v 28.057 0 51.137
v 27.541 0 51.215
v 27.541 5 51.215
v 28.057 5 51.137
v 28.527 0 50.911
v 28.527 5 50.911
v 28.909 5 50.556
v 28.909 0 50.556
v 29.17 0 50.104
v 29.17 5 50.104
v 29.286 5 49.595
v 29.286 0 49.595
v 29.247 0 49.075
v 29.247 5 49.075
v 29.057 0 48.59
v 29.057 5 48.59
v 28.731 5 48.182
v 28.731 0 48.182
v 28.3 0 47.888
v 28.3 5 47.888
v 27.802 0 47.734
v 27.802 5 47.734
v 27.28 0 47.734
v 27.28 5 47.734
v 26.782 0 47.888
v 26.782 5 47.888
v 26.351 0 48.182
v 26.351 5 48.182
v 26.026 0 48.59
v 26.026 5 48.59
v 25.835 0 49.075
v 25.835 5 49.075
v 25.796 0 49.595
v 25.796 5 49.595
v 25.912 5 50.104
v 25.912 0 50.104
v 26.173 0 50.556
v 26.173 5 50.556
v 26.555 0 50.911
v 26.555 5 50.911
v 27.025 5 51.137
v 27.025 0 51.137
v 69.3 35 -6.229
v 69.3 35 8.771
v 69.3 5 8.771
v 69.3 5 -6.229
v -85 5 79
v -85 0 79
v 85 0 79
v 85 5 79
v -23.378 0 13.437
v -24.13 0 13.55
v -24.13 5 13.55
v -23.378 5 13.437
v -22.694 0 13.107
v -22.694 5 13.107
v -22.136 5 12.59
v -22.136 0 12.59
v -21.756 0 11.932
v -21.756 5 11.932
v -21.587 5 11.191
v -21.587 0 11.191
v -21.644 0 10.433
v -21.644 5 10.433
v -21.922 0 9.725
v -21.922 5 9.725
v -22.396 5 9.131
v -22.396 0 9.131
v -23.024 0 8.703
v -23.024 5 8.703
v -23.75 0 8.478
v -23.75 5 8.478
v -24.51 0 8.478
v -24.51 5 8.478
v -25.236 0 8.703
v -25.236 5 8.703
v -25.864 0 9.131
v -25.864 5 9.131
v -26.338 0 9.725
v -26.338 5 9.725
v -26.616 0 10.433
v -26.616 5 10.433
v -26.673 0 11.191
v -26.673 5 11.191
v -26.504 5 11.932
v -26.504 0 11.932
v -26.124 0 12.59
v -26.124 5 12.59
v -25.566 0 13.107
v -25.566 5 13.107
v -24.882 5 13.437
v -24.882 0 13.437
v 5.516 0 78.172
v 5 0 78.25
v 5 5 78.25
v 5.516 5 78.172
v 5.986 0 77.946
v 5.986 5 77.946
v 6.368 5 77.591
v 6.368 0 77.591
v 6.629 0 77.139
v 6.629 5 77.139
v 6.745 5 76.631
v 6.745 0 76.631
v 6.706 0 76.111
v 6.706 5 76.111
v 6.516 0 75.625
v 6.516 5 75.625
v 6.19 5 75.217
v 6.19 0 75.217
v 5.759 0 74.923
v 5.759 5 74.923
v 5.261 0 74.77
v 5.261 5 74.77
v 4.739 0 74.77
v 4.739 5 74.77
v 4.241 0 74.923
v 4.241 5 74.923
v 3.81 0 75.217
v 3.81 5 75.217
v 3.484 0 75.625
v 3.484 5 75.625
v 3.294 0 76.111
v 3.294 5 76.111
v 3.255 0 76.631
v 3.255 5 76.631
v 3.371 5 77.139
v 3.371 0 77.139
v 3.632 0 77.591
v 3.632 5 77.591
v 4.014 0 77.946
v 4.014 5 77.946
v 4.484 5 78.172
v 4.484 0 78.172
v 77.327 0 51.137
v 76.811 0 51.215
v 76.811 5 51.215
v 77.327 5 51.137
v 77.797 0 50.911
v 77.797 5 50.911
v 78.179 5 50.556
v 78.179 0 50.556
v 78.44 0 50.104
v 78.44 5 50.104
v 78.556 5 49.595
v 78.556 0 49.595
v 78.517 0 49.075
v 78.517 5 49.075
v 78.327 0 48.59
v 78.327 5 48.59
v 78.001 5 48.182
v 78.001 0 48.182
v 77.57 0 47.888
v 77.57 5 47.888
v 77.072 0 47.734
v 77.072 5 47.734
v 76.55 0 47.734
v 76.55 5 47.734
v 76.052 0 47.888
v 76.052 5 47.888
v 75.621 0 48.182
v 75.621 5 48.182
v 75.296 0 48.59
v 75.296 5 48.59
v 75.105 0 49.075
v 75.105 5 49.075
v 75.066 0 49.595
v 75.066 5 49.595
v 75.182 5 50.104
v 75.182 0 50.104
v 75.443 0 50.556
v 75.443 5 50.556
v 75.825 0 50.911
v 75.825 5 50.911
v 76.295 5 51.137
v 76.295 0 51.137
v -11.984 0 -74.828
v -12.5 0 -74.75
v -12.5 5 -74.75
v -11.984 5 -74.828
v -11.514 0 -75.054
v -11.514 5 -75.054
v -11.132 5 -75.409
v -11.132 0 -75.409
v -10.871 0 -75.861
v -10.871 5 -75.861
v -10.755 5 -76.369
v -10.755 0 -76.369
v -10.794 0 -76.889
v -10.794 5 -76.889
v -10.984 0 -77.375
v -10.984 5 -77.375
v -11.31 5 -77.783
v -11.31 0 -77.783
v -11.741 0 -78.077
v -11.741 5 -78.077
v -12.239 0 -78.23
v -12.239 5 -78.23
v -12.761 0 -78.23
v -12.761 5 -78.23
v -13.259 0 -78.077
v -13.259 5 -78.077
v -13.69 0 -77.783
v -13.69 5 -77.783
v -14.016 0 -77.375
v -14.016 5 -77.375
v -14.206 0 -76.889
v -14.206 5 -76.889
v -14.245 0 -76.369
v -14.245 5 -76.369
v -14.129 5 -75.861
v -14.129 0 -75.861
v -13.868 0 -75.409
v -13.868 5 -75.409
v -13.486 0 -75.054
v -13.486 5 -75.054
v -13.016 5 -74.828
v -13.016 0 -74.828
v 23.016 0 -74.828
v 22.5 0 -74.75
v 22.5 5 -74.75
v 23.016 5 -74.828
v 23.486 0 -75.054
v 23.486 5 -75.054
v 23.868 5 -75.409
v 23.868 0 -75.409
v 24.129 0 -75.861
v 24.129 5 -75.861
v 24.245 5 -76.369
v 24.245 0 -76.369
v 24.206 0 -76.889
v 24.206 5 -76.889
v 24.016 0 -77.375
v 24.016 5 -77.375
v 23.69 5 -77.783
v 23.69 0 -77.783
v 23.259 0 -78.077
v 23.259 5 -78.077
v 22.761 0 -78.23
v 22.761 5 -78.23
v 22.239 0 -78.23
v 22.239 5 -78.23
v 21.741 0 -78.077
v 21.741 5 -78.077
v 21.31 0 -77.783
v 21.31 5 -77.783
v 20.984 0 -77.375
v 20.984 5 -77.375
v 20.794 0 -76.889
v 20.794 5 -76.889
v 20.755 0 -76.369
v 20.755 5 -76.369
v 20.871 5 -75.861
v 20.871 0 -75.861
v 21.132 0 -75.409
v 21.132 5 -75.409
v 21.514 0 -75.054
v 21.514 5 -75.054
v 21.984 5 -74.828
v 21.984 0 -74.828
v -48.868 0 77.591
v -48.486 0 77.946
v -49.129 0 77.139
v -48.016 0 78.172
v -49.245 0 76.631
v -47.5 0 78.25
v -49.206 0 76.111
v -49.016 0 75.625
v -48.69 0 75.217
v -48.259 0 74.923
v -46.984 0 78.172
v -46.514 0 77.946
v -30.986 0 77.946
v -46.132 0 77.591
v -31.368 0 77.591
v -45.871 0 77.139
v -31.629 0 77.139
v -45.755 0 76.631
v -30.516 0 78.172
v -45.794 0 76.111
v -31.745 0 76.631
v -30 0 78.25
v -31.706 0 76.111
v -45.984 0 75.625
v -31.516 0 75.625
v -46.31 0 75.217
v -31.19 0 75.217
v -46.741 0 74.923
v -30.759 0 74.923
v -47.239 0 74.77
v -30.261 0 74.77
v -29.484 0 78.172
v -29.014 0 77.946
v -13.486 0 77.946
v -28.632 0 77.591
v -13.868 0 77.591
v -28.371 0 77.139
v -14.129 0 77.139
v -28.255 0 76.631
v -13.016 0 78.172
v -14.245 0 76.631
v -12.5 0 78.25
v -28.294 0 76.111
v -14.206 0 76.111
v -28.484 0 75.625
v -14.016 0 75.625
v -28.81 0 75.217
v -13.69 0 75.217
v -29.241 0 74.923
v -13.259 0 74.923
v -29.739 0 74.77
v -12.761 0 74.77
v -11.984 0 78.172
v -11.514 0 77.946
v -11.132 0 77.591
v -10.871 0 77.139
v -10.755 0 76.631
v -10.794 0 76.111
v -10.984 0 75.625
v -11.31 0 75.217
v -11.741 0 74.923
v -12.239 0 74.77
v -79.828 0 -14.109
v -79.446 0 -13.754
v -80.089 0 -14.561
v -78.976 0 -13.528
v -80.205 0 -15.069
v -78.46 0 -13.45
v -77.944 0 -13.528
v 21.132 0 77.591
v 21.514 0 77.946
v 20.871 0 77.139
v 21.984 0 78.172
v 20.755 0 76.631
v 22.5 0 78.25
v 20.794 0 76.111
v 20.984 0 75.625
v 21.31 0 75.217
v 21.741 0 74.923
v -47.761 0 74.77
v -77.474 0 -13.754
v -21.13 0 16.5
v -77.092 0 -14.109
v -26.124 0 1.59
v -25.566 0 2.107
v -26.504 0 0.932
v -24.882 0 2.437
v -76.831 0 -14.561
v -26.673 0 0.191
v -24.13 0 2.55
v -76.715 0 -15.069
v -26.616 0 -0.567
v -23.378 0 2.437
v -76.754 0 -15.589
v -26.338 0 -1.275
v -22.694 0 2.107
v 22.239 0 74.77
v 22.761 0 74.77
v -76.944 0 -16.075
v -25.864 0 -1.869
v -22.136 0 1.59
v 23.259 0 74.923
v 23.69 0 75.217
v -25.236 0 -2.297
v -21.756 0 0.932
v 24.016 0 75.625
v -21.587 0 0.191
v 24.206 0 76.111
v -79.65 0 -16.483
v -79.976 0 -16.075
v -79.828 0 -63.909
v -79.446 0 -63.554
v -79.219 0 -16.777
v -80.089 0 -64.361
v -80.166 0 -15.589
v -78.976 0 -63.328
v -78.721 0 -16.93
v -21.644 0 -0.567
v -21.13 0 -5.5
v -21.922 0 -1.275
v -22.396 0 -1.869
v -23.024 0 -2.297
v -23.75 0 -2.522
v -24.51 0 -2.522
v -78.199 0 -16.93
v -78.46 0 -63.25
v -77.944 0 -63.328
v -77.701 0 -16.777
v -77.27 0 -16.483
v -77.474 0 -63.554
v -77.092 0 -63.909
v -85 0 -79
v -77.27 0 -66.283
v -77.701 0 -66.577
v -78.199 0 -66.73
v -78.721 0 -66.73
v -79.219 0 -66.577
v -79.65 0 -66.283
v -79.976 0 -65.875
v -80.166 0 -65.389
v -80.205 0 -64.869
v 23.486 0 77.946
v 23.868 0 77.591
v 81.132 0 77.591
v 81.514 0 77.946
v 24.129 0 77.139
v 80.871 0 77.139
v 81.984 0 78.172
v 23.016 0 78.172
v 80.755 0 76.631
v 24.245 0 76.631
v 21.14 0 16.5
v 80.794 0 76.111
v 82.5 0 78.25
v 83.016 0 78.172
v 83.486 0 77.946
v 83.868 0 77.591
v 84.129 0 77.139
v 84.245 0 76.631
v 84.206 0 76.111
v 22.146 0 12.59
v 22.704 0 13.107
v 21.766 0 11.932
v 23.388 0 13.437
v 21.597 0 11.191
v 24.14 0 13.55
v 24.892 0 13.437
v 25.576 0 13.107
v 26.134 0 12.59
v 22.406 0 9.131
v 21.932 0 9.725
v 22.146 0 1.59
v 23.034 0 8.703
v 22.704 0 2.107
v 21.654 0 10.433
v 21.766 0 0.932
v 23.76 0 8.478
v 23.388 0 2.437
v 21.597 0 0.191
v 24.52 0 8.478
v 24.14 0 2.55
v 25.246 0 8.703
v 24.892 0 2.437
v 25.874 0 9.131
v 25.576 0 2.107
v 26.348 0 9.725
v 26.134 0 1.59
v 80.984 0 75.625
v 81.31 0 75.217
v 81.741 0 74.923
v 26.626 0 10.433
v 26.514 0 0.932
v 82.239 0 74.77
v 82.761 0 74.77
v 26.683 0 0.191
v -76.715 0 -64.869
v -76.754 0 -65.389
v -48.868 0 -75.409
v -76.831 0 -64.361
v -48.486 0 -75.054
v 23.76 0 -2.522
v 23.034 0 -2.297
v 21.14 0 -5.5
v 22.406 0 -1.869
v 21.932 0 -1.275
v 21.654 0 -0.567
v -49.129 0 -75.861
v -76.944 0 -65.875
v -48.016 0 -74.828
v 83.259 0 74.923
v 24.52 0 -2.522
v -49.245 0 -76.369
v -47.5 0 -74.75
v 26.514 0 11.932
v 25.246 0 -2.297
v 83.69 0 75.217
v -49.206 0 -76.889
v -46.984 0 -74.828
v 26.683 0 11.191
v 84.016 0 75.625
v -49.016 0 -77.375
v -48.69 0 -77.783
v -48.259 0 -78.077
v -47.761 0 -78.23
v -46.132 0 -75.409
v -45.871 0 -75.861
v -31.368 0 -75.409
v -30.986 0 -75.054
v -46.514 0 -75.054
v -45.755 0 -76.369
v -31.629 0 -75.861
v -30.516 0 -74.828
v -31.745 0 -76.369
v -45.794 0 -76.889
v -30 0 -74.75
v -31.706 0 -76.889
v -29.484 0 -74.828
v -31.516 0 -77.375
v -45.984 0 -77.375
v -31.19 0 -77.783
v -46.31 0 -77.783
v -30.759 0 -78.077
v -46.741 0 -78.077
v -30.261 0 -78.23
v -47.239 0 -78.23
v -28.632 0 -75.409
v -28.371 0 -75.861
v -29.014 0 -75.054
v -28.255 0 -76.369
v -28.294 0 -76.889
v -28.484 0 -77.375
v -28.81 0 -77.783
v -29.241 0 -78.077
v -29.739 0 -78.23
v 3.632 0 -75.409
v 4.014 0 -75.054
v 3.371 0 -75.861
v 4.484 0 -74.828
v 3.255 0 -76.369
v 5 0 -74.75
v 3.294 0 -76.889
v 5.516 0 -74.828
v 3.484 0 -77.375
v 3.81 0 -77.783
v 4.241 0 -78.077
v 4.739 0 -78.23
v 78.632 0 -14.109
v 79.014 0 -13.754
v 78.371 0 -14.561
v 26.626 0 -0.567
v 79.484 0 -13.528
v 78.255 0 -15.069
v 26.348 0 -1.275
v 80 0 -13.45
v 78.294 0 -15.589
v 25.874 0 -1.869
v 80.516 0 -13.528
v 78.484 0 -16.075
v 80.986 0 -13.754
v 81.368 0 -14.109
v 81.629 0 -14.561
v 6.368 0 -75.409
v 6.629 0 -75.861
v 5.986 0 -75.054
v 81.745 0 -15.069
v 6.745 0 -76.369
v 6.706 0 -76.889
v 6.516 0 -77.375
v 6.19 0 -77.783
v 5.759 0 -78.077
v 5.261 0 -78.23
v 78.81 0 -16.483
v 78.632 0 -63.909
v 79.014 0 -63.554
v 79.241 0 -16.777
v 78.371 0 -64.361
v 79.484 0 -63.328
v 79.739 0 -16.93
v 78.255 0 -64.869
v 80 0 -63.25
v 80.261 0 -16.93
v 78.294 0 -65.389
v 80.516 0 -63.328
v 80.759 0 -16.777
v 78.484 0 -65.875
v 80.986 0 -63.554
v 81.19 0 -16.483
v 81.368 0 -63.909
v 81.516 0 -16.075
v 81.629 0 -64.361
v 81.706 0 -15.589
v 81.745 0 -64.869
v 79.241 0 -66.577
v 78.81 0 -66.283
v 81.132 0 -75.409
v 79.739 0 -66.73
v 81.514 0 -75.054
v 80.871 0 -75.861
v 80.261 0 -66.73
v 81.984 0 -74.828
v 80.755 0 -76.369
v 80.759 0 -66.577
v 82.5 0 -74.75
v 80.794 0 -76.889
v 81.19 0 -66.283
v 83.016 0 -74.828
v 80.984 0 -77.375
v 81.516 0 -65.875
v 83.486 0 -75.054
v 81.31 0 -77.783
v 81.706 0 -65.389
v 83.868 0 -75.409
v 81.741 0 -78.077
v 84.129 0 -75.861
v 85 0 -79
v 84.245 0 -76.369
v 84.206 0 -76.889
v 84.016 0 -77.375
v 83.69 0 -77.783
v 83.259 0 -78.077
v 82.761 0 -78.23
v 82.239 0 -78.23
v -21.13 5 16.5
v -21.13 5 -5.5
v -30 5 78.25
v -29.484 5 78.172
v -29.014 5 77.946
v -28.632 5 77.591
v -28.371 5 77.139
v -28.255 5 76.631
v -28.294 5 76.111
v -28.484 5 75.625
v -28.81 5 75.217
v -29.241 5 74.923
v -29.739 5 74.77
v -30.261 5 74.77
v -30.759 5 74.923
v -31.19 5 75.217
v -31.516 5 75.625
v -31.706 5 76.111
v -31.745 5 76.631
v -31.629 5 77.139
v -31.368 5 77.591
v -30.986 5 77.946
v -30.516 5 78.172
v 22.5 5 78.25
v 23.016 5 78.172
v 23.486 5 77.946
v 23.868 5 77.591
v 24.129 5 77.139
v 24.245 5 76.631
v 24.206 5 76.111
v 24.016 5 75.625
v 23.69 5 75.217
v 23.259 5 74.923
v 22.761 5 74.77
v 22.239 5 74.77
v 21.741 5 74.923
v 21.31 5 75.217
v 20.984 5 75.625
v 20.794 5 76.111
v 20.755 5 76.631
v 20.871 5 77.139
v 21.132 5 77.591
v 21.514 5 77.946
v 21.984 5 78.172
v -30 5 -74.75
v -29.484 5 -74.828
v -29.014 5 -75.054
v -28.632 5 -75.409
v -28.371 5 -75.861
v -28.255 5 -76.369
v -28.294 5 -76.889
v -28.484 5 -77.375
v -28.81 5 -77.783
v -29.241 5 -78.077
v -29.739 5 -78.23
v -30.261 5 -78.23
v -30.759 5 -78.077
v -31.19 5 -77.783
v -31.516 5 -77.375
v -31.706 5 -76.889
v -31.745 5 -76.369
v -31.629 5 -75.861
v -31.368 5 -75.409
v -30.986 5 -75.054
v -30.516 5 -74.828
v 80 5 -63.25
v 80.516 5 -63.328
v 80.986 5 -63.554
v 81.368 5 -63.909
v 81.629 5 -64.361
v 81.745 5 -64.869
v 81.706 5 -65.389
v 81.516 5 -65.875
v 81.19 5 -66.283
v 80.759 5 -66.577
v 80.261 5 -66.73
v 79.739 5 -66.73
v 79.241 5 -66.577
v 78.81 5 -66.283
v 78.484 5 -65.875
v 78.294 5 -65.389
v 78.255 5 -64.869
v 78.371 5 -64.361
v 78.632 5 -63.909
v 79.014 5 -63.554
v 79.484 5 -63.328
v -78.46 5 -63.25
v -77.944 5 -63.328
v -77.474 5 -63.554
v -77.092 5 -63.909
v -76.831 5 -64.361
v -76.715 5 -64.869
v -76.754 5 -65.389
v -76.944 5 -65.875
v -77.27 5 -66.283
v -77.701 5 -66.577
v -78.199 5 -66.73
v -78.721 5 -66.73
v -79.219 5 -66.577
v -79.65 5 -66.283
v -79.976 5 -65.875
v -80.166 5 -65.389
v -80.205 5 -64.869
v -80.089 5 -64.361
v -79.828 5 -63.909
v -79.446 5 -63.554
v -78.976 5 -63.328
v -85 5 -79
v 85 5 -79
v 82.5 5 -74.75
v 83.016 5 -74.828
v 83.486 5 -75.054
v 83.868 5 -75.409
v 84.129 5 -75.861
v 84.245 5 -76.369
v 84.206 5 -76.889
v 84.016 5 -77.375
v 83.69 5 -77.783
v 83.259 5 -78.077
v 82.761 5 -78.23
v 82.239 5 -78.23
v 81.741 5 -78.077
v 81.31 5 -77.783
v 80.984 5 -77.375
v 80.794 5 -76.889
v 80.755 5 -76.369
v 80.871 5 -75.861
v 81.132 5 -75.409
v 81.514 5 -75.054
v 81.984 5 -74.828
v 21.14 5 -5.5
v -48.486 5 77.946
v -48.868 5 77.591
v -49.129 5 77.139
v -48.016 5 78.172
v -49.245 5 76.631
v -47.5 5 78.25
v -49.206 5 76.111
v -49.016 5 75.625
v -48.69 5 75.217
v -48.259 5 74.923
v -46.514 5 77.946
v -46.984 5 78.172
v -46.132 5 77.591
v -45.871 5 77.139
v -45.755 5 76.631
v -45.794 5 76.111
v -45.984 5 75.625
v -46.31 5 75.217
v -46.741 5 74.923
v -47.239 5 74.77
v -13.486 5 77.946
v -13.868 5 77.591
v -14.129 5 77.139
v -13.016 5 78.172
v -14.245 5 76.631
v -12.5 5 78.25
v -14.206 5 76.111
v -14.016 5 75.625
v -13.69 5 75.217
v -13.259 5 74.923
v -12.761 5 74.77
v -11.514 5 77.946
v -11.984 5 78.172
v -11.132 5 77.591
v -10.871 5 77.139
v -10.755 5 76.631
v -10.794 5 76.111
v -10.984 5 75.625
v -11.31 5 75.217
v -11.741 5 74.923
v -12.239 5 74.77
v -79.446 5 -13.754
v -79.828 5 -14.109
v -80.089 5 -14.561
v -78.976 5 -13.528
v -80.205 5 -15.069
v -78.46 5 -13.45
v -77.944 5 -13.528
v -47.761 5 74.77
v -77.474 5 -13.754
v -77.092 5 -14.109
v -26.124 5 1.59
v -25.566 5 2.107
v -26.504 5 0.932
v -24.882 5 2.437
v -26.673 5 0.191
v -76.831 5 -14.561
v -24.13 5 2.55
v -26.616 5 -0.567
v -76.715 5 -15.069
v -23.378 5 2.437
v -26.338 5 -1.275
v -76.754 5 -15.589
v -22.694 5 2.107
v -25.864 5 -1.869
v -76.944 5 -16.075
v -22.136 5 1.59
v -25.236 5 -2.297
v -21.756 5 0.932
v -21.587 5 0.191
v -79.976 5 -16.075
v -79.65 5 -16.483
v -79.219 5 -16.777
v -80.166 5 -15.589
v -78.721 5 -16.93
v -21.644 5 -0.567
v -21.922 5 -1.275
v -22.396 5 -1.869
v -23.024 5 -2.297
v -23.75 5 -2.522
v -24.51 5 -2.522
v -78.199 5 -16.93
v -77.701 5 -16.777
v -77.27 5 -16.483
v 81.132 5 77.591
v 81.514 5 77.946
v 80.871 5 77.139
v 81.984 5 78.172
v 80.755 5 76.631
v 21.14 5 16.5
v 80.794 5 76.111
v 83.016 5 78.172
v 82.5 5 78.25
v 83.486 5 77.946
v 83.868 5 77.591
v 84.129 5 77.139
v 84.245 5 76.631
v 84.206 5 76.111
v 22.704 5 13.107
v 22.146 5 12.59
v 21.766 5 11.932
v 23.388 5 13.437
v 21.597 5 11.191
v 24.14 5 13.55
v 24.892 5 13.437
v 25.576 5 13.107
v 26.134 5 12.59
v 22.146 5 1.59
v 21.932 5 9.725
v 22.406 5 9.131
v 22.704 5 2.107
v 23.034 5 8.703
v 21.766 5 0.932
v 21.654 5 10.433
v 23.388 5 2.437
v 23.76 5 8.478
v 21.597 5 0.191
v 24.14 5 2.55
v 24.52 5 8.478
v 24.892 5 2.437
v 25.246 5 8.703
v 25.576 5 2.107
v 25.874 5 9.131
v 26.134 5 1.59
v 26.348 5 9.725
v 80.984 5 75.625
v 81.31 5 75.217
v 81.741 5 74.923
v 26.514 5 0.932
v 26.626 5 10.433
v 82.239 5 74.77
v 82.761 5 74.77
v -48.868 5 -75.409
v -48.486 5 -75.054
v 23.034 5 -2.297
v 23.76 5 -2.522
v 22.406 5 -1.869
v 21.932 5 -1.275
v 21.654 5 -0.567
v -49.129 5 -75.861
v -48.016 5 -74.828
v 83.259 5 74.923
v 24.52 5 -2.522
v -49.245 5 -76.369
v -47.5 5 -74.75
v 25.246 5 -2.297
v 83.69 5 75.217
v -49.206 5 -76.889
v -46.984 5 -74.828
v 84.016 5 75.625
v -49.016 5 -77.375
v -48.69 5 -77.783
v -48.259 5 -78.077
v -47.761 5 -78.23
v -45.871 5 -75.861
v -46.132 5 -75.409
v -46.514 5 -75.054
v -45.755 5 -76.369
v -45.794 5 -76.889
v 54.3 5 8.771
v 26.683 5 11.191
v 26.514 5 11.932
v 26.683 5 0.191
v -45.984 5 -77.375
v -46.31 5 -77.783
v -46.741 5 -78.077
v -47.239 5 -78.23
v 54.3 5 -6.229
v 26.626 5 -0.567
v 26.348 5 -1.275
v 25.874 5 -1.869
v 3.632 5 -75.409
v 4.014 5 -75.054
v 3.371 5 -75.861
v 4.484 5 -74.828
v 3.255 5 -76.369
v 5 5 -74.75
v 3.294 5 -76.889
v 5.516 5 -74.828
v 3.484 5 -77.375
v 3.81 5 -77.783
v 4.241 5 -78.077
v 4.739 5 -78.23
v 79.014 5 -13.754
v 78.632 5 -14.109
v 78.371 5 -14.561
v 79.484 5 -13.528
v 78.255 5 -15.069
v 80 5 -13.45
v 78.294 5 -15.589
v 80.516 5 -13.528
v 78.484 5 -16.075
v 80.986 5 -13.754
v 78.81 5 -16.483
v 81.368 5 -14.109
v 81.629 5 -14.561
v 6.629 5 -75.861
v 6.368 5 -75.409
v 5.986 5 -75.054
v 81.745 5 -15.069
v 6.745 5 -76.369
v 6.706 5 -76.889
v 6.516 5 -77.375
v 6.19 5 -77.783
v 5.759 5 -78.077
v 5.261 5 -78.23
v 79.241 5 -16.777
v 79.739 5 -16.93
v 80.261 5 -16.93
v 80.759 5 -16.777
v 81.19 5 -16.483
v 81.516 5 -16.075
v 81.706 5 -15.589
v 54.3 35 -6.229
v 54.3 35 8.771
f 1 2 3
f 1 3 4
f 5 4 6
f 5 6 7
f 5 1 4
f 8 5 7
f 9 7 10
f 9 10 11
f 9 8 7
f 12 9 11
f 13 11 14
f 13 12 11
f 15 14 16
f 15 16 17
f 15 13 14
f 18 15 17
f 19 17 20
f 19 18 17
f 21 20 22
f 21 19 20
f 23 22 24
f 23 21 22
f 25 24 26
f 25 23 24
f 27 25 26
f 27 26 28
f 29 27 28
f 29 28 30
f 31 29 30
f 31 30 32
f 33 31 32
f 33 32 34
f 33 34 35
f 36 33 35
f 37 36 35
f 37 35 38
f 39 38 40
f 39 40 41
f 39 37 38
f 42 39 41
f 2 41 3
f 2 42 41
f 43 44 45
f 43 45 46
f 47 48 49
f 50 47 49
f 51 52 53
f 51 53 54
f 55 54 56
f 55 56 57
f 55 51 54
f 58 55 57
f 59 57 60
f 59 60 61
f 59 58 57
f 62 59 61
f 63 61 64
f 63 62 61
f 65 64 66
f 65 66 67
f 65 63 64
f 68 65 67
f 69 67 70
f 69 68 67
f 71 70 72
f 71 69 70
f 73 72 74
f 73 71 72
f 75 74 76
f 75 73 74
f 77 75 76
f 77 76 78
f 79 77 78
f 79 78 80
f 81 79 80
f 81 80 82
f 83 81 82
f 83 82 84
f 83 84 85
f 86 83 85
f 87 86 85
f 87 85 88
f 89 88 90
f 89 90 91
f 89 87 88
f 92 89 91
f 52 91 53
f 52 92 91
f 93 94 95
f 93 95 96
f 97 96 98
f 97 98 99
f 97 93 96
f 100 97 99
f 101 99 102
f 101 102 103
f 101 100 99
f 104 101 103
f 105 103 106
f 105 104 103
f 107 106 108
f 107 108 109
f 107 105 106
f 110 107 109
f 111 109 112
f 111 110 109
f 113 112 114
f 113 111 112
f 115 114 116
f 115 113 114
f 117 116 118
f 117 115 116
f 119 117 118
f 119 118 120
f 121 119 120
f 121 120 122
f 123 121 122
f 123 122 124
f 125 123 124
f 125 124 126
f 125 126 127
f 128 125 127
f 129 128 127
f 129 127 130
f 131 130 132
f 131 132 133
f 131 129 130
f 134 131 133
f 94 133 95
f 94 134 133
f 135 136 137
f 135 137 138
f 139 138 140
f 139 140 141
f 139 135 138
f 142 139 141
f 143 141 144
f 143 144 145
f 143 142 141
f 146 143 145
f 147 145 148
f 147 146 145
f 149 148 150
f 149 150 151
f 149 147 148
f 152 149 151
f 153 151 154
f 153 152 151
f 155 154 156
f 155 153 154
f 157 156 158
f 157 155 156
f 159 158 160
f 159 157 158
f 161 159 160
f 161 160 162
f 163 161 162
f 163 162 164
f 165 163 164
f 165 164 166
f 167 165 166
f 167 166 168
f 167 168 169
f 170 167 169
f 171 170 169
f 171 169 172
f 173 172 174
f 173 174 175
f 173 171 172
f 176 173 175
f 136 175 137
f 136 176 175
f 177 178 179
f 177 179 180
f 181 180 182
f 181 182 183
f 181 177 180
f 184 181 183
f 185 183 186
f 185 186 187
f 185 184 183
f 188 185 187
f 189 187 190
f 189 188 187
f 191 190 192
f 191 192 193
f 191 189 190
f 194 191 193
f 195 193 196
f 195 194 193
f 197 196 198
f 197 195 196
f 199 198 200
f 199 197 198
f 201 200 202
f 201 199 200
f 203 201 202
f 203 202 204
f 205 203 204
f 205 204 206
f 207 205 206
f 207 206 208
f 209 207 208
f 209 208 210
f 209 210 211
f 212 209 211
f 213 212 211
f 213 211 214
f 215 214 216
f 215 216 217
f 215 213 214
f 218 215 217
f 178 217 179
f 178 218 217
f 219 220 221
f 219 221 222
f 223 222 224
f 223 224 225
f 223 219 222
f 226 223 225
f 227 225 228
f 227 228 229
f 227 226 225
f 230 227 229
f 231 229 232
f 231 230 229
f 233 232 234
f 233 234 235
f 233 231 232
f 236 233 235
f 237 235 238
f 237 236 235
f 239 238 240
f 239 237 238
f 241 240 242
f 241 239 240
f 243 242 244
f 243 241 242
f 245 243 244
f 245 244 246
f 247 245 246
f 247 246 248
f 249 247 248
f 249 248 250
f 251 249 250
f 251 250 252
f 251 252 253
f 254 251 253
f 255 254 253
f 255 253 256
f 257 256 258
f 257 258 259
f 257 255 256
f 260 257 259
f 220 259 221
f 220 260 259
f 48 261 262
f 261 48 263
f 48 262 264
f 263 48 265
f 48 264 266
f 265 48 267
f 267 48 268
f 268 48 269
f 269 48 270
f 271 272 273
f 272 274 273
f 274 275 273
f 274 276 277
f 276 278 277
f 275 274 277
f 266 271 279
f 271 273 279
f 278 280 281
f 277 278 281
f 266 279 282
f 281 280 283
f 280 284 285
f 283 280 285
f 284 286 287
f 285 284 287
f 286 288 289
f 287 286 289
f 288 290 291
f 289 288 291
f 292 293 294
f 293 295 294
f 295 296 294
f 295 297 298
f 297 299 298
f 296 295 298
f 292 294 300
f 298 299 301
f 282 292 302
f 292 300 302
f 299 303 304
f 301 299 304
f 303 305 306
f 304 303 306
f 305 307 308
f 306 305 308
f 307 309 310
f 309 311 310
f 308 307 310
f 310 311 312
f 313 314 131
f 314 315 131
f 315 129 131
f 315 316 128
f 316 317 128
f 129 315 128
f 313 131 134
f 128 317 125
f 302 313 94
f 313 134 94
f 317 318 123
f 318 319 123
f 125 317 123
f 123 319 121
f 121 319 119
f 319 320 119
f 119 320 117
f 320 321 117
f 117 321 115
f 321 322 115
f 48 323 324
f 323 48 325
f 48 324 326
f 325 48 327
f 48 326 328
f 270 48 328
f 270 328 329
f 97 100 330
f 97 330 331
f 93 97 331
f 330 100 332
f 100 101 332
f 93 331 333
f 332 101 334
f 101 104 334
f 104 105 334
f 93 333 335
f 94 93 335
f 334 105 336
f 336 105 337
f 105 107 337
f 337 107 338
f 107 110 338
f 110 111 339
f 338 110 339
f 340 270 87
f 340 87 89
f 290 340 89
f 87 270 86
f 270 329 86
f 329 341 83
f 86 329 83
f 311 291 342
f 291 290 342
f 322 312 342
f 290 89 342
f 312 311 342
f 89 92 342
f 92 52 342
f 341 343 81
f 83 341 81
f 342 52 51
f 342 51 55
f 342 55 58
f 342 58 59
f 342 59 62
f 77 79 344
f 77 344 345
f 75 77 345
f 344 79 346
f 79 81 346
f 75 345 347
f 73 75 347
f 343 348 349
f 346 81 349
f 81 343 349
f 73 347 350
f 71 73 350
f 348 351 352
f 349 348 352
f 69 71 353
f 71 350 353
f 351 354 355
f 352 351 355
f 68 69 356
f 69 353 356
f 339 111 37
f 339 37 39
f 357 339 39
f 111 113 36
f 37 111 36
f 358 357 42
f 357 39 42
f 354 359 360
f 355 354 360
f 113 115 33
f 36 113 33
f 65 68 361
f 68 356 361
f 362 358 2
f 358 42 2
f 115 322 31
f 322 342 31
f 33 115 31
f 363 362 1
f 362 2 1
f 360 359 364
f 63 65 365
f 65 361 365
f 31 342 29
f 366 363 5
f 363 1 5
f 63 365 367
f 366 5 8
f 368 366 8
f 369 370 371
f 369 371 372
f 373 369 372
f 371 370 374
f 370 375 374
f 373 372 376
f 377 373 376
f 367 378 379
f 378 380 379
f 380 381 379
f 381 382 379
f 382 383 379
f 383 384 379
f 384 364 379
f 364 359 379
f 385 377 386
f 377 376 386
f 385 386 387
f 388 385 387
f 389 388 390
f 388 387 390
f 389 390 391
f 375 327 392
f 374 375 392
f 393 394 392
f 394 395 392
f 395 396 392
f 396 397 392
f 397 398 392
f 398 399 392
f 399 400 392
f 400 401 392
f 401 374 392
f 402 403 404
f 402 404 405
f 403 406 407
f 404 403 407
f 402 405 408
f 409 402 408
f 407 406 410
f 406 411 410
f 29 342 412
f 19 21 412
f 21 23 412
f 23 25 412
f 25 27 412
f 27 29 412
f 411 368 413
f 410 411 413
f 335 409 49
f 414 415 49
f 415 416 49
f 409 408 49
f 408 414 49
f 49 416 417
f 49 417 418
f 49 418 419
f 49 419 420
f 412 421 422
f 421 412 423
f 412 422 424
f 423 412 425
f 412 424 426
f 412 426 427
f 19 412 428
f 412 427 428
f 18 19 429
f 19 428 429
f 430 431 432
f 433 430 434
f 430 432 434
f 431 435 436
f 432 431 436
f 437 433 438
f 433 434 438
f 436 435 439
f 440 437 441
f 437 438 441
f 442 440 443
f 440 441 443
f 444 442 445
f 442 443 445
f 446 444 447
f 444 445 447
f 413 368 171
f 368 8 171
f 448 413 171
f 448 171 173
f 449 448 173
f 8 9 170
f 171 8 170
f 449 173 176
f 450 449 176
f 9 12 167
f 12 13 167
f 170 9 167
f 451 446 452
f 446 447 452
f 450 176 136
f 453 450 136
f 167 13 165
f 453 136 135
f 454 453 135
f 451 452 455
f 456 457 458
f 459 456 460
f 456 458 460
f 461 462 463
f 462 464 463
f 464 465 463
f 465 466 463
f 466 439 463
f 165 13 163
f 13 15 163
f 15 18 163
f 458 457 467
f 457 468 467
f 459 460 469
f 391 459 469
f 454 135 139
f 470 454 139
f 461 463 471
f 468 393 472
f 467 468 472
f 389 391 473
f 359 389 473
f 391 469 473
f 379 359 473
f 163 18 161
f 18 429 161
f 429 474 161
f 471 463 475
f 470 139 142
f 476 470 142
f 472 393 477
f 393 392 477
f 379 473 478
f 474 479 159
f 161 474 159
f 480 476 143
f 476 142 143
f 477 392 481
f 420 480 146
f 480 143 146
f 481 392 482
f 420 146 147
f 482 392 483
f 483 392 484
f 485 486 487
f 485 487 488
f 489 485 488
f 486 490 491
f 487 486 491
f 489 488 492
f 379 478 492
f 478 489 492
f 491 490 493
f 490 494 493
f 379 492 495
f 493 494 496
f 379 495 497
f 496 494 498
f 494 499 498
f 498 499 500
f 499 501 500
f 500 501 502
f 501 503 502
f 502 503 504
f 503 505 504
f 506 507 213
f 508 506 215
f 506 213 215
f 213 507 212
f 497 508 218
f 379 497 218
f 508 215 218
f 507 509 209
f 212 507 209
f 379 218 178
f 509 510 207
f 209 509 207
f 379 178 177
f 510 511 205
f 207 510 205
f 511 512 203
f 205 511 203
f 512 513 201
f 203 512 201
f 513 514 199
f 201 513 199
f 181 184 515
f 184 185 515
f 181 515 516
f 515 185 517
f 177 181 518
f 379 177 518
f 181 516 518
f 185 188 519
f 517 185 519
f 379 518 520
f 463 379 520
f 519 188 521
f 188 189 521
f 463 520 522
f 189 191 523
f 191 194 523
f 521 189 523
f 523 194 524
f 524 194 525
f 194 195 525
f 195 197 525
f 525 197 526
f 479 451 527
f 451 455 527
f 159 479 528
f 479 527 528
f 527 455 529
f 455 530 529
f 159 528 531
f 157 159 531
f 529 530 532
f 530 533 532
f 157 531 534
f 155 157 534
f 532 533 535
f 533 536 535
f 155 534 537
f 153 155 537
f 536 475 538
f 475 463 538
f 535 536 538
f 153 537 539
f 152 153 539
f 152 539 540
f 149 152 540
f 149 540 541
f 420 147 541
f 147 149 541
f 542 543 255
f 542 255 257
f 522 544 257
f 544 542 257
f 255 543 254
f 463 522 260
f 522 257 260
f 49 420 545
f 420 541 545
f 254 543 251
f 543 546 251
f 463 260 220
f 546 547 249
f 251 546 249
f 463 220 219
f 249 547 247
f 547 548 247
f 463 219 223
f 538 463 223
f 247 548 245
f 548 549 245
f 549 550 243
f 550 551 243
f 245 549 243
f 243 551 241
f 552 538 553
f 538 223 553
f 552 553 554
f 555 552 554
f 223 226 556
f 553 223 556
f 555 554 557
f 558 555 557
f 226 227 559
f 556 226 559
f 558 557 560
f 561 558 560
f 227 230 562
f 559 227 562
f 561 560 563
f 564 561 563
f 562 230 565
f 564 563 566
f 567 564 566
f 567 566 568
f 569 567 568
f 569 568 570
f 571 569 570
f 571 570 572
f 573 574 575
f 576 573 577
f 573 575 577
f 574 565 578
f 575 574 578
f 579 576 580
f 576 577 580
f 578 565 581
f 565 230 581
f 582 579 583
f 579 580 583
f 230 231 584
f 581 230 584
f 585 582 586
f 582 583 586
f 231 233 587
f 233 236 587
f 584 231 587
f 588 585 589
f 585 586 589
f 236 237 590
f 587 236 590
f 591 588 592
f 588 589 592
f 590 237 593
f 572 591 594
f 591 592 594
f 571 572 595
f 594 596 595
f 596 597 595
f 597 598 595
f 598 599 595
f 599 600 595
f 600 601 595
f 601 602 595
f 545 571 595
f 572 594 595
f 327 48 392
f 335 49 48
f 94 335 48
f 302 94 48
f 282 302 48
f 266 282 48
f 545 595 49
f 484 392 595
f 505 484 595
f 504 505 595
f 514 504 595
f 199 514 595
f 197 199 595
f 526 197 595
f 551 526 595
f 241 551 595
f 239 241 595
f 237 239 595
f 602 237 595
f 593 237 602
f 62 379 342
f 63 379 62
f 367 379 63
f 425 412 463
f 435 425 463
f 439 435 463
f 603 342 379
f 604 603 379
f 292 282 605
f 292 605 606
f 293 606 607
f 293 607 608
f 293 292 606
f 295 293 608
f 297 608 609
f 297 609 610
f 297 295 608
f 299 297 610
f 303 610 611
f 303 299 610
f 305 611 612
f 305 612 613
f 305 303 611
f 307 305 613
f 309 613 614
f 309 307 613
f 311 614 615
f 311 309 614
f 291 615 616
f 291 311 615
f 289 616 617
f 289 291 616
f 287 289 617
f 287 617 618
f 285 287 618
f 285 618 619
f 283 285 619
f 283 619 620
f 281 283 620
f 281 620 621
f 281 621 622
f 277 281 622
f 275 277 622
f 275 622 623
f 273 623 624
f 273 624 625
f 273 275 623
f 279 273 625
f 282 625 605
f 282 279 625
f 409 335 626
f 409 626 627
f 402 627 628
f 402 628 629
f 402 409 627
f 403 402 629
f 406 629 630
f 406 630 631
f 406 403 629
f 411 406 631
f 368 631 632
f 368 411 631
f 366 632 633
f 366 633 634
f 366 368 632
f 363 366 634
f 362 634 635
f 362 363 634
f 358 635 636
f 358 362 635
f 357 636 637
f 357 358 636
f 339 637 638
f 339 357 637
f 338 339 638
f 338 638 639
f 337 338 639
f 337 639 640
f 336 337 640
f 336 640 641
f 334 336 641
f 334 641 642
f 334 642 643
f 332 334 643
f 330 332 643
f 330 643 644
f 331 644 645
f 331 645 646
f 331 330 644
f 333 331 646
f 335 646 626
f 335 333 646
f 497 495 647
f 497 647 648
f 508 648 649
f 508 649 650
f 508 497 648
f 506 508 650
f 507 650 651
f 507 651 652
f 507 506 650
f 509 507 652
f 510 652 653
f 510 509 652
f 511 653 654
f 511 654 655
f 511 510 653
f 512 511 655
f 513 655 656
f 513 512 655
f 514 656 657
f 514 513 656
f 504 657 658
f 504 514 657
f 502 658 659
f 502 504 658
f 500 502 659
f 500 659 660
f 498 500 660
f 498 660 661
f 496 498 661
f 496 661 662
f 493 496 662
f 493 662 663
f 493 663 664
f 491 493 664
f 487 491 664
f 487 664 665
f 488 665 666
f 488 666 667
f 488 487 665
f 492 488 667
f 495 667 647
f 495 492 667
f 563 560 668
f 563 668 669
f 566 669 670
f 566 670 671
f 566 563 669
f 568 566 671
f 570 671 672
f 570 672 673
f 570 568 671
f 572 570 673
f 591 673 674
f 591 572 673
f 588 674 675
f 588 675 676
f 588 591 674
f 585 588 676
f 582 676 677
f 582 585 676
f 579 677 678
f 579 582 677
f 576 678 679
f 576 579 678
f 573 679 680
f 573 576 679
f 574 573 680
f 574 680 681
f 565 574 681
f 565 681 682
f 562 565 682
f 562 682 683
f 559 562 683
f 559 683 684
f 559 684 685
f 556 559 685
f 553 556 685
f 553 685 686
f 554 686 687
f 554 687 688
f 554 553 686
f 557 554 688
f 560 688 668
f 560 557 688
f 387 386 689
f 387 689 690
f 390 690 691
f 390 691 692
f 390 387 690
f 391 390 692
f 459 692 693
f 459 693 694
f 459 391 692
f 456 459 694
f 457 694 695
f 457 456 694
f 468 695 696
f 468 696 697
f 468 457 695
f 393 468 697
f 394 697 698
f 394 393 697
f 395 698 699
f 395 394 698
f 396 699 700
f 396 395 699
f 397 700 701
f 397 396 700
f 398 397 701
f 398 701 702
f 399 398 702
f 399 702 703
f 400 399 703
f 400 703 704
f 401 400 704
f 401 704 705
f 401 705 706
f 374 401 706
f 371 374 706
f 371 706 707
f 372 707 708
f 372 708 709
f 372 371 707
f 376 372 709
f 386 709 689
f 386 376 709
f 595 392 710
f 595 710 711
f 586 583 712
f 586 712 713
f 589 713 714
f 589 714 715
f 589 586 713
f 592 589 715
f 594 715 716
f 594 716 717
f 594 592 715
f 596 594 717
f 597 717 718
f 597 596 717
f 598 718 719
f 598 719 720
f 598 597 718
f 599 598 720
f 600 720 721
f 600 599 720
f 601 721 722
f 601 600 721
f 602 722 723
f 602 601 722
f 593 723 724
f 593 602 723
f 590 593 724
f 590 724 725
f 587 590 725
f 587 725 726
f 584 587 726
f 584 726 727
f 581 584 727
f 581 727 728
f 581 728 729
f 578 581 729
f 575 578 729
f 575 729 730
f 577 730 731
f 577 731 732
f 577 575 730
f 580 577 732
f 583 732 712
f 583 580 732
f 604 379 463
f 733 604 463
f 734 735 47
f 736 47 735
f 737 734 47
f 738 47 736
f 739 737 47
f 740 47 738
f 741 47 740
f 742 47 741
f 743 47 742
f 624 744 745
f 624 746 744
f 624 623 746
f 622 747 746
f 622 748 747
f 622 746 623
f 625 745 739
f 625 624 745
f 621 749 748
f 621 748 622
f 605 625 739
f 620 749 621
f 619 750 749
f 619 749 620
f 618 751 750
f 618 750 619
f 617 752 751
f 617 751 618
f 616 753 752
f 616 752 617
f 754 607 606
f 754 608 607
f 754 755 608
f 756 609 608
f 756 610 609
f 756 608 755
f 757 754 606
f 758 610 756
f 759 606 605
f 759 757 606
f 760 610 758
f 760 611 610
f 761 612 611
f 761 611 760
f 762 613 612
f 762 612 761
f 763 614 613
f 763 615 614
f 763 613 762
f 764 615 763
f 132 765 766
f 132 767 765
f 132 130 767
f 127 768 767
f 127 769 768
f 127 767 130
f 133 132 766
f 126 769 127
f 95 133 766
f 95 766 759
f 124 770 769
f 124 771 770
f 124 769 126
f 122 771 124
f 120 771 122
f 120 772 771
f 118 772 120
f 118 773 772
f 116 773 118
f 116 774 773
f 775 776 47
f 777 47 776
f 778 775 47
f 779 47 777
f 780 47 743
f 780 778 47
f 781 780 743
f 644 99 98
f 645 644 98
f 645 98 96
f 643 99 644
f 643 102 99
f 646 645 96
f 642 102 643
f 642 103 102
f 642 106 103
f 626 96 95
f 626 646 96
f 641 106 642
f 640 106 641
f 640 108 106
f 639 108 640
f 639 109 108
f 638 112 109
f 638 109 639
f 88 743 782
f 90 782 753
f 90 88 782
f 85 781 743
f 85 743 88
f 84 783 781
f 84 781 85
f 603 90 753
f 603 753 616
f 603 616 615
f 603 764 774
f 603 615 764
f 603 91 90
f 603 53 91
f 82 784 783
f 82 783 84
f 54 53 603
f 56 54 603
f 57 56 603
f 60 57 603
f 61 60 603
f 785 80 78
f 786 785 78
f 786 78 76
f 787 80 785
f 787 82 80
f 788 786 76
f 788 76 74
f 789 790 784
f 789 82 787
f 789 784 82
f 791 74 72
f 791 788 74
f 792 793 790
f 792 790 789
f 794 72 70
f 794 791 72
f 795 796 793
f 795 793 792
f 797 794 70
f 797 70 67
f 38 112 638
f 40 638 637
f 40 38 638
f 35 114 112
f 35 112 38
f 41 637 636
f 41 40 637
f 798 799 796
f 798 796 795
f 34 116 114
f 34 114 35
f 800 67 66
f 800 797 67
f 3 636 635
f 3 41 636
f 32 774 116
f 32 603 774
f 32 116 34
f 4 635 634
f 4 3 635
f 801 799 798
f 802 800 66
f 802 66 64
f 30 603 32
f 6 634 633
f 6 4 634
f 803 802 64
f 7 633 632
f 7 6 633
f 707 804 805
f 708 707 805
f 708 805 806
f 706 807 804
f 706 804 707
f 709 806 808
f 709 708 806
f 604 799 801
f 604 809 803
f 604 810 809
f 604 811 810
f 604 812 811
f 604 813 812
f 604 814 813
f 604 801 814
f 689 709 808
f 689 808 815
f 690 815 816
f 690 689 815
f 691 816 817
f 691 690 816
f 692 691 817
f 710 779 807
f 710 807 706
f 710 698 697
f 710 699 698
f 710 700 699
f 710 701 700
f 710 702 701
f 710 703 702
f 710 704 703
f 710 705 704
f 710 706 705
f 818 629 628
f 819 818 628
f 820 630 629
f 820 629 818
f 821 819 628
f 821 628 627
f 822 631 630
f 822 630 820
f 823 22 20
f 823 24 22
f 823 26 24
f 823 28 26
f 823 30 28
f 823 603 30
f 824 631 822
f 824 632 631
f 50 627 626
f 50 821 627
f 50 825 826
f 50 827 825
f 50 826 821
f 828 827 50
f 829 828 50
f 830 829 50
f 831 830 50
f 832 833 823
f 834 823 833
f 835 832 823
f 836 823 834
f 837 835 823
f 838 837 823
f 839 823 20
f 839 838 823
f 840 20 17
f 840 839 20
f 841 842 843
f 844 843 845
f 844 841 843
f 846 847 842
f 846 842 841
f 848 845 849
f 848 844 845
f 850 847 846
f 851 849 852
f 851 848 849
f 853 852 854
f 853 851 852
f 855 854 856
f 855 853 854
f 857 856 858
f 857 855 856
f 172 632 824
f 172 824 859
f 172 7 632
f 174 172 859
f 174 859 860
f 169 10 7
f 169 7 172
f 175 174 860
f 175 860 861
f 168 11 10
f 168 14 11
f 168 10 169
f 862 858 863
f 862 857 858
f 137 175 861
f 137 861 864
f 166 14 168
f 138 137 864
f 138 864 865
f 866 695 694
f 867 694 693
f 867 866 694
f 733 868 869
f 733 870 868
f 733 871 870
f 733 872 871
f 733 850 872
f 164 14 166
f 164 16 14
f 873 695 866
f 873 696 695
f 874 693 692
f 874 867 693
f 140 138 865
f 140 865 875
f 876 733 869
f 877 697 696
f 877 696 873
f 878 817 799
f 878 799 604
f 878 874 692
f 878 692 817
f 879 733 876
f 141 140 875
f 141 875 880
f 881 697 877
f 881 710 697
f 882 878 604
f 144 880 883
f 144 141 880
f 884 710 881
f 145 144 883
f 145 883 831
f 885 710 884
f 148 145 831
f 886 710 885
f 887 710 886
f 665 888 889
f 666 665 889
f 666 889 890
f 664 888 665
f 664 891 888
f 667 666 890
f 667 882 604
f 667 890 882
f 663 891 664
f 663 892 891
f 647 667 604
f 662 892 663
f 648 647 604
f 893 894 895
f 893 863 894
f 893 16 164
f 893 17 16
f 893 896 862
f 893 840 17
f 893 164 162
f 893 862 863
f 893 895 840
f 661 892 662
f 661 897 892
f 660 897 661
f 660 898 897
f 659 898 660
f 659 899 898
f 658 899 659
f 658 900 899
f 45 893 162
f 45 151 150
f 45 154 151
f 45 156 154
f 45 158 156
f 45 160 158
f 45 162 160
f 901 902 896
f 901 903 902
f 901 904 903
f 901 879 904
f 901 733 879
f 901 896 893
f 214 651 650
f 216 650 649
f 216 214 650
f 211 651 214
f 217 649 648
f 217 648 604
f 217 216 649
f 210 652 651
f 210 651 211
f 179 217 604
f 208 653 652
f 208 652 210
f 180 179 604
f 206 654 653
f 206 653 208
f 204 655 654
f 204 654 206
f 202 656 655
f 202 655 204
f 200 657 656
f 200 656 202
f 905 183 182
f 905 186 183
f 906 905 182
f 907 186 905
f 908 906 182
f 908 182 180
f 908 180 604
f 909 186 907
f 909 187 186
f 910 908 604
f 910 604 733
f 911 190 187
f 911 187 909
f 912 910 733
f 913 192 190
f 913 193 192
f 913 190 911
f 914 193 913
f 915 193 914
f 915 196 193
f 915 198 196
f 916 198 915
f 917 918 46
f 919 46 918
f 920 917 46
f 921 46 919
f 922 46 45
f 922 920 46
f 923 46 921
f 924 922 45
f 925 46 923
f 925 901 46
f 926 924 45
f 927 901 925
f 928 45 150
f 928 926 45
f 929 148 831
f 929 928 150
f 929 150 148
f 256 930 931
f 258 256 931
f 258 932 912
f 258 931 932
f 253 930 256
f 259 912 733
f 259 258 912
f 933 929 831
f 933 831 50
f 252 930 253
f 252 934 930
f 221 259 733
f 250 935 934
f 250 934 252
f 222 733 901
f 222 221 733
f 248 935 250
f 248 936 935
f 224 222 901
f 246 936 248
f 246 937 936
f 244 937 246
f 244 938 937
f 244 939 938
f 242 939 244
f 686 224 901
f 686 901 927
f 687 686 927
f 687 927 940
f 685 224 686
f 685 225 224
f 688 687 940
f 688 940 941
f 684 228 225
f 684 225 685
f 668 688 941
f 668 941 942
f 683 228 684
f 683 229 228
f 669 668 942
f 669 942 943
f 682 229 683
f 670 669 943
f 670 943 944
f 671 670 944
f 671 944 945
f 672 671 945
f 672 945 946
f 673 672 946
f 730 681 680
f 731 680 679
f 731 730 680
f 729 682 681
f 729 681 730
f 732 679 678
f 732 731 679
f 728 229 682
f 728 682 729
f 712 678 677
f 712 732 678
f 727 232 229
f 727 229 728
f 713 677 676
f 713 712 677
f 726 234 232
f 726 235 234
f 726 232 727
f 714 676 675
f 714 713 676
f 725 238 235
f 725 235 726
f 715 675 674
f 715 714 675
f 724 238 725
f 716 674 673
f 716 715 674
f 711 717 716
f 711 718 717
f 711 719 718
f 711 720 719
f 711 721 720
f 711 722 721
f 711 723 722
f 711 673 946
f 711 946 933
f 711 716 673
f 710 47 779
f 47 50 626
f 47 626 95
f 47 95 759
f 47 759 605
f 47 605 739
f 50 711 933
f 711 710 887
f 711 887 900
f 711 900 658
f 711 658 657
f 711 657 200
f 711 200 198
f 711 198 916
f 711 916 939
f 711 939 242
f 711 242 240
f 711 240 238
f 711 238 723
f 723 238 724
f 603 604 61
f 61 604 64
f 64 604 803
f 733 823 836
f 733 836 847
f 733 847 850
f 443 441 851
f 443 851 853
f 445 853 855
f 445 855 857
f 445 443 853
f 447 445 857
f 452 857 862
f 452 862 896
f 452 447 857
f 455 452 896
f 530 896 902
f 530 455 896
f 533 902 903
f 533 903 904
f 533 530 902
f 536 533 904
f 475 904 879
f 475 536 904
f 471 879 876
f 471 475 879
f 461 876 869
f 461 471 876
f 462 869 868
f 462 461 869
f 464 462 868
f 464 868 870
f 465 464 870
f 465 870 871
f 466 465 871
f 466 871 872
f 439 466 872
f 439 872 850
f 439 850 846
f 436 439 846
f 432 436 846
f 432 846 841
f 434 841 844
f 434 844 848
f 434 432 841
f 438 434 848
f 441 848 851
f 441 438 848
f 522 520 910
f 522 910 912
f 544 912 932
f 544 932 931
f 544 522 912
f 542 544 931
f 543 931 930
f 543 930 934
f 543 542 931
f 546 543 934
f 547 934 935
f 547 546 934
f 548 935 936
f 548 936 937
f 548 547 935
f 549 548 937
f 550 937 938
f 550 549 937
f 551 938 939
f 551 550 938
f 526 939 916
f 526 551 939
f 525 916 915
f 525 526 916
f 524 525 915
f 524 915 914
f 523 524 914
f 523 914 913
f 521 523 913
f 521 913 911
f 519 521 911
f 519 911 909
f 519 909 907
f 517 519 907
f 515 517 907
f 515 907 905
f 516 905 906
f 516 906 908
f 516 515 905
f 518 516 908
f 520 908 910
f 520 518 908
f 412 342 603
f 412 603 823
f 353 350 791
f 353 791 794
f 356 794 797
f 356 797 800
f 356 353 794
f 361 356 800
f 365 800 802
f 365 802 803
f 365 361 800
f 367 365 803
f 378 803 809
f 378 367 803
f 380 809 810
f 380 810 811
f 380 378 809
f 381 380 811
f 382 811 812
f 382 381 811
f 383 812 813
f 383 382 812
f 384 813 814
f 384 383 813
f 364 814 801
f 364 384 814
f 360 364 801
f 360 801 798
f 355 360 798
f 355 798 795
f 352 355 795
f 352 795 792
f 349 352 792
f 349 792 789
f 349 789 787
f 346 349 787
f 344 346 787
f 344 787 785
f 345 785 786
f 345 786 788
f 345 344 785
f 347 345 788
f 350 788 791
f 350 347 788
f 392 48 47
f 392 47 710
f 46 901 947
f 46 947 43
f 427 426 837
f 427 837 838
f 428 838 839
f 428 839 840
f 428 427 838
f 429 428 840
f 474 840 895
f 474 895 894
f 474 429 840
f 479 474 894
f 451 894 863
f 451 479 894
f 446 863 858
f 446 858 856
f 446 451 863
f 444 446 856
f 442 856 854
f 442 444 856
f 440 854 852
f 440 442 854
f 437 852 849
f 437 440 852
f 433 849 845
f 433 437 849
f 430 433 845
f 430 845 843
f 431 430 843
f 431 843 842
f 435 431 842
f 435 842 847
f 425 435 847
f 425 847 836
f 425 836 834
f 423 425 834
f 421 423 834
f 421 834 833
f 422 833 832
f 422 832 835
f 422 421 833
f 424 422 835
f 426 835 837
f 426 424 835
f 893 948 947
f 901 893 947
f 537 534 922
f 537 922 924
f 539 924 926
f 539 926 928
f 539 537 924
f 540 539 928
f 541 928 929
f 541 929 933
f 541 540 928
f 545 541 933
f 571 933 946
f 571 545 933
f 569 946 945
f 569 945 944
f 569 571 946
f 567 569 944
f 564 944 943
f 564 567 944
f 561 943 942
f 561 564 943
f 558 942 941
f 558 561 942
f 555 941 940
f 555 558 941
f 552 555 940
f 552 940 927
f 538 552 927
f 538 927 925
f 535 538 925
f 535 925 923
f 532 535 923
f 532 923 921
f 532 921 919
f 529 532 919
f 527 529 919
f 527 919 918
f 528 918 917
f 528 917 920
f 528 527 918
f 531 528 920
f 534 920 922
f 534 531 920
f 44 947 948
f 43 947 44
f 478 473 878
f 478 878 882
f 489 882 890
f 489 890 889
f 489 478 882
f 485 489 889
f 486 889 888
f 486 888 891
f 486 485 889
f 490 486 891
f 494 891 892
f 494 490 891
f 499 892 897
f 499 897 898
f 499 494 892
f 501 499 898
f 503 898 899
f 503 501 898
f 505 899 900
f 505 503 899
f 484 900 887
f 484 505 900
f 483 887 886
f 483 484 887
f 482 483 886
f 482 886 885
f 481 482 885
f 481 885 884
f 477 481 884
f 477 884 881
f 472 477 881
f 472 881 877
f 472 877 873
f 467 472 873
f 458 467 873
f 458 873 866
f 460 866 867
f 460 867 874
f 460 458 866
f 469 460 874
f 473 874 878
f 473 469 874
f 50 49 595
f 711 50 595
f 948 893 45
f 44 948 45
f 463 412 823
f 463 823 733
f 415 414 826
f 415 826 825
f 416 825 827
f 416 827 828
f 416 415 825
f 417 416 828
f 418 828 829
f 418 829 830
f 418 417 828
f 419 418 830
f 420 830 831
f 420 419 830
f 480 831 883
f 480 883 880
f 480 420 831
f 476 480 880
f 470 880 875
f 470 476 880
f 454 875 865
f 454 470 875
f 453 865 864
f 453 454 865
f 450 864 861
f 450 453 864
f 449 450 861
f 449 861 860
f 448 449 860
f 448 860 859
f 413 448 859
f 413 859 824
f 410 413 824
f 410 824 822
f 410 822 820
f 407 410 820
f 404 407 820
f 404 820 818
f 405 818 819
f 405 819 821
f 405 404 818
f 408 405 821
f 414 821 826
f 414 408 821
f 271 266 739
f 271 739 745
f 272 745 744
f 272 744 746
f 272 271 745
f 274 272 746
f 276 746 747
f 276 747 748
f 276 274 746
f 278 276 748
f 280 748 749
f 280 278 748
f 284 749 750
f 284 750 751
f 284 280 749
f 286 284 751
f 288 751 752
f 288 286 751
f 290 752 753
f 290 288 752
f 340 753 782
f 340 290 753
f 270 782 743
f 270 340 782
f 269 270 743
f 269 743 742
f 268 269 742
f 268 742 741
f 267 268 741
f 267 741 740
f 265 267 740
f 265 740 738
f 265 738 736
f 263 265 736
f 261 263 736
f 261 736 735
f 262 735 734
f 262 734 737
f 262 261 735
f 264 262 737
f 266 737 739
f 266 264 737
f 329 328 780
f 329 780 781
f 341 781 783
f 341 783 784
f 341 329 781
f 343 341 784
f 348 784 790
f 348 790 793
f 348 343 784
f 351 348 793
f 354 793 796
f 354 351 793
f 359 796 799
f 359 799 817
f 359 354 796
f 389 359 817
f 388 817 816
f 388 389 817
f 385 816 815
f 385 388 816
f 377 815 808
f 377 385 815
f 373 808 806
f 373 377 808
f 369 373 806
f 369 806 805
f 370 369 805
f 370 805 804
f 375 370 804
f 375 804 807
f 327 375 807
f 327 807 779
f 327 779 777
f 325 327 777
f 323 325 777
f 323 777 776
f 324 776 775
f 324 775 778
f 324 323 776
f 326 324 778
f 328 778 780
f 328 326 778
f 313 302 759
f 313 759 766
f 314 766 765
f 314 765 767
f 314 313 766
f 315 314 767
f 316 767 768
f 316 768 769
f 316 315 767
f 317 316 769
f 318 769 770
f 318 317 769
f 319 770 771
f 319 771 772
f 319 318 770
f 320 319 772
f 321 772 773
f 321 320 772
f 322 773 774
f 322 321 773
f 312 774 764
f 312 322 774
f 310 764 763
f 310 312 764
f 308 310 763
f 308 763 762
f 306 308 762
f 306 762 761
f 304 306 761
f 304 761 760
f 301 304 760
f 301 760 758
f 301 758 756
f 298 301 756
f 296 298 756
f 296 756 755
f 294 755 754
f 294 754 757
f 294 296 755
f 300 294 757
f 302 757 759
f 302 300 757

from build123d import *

# Parameters (mm, degrees)
SKETCH1_W           = 170
SKETCH1_H           = 158
SKETCH1_R           = 1.75
SKETCH1_R_2         = 2.55
SKETCH1_W_2         = 42.27
SKETCH1_H_2         = 22
BOSS_EXTRUDE1_DEPTH = 5
SKETCH2_W           = 15
SKETCH2_H           = 15
BOSS_EXTRUDE2_DEPTH = 30


with BuildPart() as part:
    # Sketch1 → Boss-Extrude1 (new body)
    with BuildSketch(Plane(origin=(0, 0, 0), x_dir=(1, 0, 0), z_dir=(0, 1, 0))):
        Rectangle(SKETCH1_W, SKETCH1_H)
        with Locations(Location((82.5, 76.5, 0), (0, 0, 270))):
            Circle(SKETCH1_R, mode=Mode.SUBTRACT)
        with Locations(Location((22.5, 76.5, 0), (0, 0, 270))):
            Circle(SKETCH1_R, mode=Mode.SUBTRACT)
        with Locations(Location((5, 76.5, 0), (0, 0, 270))):
            Circle(SKETCH1_R, mode=Mode.SUBTRACT)
        with Locations(Location((-12.5, 76.5, 0), (0, 0, 270))):
            Circle(SKETCH1_R, mode=Mode.SUBTRACT)
        with Locations(Location((-30, 76.5, 0), (0, 0, 270))):
            Circle(SKETCH1_R, mode=Mode.SUBTRACT)
        with Locations(Location((-47.5, 76.5, 0), (0, 0, 270))):
            Circle(SKETCH1_R, mode=Mode.SUBTRACT)
        with Locations(Location((82.5, -76.5, 0), (0, 0, 270))):
            Circle(SKETCH1_R, mode=Mode.SUBTRACT)
        with Locations(Location((22.5, -76.5, 0), (0, 0, 270))):
            Circle(SKETCH1_R, mode=Mode.SUBTRACT)
        with Locations(Location((5, -76.5, 0), (0, 0, 270))):
            Circle(SKETCH1_R, mode=Mode.SUBTRACT)
        with Locations(Location((-12.5, -76.5, 0), (0, 0, 270))):
            Circle(SKETCH1_R, mode=Mode.SUBTRACT)
        with Locations(Location((-30, -76.5, 0), (0, 0, 270))):
            Circle(SKETCH1_R, mode=Mode.SUBTRACT)
        with Locations(Location((-47.5, -76.5, 0), (0, 0, 270))):
            Circle(SKETCH1_R, mode=Mode.SUBTRACT)
        with Locations(Location((80, 15.2, 0), (0, 0, 270))):
            Circle(SKETCH1_R, mode=Mode.SUBTRACT)
        with Locations(Location((-78.46, 15.2, 0), (0, 0, 270))):
            Circle(SKETCH1_R, mode=Mode.SUBTRACT)
        with Locations(Location((24.14, -11, 0), (0, 0, 270))):
            Circle(SKETCH1_R_2, mode=Mode.SUBTRACT)
        with Locations(Location((24.14, 0, 0), (0, 0, 270))):
            Circle(SKETCH1_R_2, mode=Mode.SUBTRACT)
        with Locations(Location((-24.13, 0, 0), (0, 0, 270))):
            Circle(SKETCH1_R_2, mode=Mode.SUBTRACT)
        with Locations(Location((-24.13, -11, 0), (0, 0, 270))):
            Circle(SKETCH1_R_2, mode=Mode.SUBTRACT)
        with Locations(Location((80, 65, 0), (0, 0, 270))):
            Circle(SKETCH1_R, mode=Mode.SUBTRACT)
        with Locations(Location((-78.46, 65, 0), (0, 0, 270))):
            Circle(SKETCH1_R, mode=Mode.SUBTRACT)
        with Locations(Location((76.811114527, -49.46471284, 0), (0, 0, 270))):
            Circle(SKETCH1_R, mode=Mode.SUBTRACT)
        with Locations(Location((27.541114527, -49.46471284, 0), (0, 0, 270))):
            Circle(SKETCH1_R, mode=Mode.SUBTRACT)
        with Locations((0.005, -5.5)):
            Rectangle(SKETCH1_W_2, SKETCH1_H_2, mode=Mode.SUBTRACT)
    extrude(amount=BOSS_EXTRUDE1_DEPTH)

    # Sketch2 → Boss-Extrude2 (add)
    with BuildSketch(Plane(origin=(0, 5, 0), x_dir=(1, 0, 0), z_dir=(0, 1, 0))):
        with Locations((61.800323829, -1.270769853)):
            Rectangle(SKETCH2_W, SKETCH2_H)
    extrude(amount=BOSS_EXTRUDE2_DEPTH)


solid = part.part
